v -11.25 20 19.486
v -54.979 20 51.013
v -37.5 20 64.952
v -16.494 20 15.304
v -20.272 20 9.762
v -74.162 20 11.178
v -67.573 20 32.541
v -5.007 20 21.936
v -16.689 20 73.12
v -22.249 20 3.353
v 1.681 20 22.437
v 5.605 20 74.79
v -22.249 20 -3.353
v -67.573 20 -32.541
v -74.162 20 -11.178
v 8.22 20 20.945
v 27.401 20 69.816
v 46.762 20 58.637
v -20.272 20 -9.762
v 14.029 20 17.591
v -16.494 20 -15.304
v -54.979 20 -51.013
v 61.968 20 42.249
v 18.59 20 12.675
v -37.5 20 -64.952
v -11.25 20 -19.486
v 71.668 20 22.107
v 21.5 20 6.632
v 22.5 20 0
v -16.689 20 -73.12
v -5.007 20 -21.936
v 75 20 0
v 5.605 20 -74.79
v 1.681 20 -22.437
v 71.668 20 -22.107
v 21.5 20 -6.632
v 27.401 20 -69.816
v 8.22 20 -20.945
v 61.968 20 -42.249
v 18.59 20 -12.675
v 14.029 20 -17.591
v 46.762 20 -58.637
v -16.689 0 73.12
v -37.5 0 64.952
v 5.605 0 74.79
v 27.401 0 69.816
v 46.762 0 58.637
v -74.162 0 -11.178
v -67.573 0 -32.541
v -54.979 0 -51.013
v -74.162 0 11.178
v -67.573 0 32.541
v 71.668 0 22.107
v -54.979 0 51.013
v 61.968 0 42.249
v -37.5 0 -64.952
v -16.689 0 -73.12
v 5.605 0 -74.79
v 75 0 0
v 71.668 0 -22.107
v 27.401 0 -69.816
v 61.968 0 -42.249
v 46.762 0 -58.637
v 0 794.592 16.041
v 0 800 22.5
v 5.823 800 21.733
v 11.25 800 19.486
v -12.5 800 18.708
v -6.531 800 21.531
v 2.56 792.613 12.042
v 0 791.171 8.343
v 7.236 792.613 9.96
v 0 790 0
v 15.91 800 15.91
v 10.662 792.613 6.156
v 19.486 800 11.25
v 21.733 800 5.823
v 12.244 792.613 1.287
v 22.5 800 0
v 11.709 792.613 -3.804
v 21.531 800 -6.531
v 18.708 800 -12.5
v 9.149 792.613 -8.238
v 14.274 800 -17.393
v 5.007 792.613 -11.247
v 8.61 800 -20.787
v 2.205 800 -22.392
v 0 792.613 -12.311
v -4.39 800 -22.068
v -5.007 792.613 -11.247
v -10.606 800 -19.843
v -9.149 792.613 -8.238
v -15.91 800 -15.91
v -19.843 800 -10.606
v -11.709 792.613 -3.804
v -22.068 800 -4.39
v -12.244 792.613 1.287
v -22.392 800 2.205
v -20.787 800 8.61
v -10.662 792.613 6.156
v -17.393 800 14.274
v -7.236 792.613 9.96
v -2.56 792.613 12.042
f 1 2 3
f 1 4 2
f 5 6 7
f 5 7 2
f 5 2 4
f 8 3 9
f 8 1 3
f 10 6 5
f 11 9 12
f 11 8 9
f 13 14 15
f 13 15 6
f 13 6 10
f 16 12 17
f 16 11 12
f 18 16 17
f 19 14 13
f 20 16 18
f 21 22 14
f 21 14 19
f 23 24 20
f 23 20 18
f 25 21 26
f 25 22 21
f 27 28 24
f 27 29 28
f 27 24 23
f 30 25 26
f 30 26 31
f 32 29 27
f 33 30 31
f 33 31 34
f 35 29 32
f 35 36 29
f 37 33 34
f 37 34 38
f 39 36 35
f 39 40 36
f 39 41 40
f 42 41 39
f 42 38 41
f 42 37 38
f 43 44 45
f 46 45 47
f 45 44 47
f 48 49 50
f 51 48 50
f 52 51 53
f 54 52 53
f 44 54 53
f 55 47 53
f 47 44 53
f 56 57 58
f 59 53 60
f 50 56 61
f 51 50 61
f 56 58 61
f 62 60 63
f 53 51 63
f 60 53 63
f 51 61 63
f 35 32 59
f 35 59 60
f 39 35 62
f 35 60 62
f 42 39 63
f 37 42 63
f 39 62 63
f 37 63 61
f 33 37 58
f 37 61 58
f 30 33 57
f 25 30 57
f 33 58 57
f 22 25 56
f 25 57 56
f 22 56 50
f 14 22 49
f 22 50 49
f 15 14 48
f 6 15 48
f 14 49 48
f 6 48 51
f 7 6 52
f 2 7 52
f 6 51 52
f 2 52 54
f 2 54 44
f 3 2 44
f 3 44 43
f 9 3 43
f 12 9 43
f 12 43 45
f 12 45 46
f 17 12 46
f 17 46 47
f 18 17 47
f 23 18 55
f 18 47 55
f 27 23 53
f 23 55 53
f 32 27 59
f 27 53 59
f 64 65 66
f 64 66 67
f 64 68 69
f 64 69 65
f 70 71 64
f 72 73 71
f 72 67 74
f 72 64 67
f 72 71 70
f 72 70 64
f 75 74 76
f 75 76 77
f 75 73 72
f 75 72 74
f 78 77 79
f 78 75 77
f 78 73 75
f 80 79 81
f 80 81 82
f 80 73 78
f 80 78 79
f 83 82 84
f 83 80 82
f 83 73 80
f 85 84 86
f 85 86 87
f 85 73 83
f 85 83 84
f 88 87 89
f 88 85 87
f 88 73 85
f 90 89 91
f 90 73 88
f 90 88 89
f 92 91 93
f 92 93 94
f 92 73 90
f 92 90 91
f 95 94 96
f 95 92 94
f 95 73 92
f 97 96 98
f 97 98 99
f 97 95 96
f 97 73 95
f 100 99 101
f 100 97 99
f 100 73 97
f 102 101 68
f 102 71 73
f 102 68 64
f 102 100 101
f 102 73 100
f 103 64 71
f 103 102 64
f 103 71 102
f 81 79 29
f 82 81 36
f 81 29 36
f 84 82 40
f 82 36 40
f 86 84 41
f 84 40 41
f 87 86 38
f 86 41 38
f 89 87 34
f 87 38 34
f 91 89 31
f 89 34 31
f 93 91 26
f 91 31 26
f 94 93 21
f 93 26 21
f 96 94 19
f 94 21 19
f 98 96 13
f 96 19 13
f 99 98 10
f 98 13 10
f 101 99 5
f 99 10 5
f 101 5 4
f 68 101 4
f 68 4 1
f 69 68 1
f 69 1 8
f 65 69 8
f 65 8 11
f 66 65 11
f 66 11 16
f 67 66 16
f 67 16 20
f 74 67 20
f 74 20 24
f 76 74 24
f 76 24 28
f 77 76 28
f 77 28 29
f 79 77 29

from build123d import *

# Parameters (mm, degrees)
SKETCH1_R           = 75
BOSS_EXTRUDE1_DEPTH = 20
SKETCH2_R           = 22.5
BOSS_EXTRUDE2_DEPTH = 780


with BuildPart() as part:
    # Sketch1 → Boss-Extrude1 (new body)
    with BuildSketch(Plane(origin=(0, 0, 0), x_dir=(1, 0, 0), z_dir=(0, 1, 0))):
        Circle(SKETCH1_R)
    extrude(amount=BOSS_EXTRUDE1_DEPTH)

    # Sketch2 → Boss-Extrude2 (add)
    with BuildSketch(Plane(origin=(0, 20, 0), x_dir=(1, 0, 0), z_dir=(0, 1, 0))):
        Circle(SKETCH2_R)
    extrude(amount=BOSS_EXTRUDE2_DEPTH)

    # Sketch4 → Cut-Revolve1 (revolve, cut)
    with BuildSketch(Plane(origin=(0, 0, 0), x_dir=(0, 0, -1), z_dir=(1, 0, 0))):
        with BuildLine():
            Line((0, 800), (-22.5, 800))
            ThreePointArc((-22.5, 800), (-12.311072252, 792.612587432), (0, 790))
            Line((0, 790), (0, 800))
        make_face()
    revolve(axis=Axis((0, 783.697468949, 0), (0, 1, 0)), mode=Mode.SUBTRACT)


solid = part.part
